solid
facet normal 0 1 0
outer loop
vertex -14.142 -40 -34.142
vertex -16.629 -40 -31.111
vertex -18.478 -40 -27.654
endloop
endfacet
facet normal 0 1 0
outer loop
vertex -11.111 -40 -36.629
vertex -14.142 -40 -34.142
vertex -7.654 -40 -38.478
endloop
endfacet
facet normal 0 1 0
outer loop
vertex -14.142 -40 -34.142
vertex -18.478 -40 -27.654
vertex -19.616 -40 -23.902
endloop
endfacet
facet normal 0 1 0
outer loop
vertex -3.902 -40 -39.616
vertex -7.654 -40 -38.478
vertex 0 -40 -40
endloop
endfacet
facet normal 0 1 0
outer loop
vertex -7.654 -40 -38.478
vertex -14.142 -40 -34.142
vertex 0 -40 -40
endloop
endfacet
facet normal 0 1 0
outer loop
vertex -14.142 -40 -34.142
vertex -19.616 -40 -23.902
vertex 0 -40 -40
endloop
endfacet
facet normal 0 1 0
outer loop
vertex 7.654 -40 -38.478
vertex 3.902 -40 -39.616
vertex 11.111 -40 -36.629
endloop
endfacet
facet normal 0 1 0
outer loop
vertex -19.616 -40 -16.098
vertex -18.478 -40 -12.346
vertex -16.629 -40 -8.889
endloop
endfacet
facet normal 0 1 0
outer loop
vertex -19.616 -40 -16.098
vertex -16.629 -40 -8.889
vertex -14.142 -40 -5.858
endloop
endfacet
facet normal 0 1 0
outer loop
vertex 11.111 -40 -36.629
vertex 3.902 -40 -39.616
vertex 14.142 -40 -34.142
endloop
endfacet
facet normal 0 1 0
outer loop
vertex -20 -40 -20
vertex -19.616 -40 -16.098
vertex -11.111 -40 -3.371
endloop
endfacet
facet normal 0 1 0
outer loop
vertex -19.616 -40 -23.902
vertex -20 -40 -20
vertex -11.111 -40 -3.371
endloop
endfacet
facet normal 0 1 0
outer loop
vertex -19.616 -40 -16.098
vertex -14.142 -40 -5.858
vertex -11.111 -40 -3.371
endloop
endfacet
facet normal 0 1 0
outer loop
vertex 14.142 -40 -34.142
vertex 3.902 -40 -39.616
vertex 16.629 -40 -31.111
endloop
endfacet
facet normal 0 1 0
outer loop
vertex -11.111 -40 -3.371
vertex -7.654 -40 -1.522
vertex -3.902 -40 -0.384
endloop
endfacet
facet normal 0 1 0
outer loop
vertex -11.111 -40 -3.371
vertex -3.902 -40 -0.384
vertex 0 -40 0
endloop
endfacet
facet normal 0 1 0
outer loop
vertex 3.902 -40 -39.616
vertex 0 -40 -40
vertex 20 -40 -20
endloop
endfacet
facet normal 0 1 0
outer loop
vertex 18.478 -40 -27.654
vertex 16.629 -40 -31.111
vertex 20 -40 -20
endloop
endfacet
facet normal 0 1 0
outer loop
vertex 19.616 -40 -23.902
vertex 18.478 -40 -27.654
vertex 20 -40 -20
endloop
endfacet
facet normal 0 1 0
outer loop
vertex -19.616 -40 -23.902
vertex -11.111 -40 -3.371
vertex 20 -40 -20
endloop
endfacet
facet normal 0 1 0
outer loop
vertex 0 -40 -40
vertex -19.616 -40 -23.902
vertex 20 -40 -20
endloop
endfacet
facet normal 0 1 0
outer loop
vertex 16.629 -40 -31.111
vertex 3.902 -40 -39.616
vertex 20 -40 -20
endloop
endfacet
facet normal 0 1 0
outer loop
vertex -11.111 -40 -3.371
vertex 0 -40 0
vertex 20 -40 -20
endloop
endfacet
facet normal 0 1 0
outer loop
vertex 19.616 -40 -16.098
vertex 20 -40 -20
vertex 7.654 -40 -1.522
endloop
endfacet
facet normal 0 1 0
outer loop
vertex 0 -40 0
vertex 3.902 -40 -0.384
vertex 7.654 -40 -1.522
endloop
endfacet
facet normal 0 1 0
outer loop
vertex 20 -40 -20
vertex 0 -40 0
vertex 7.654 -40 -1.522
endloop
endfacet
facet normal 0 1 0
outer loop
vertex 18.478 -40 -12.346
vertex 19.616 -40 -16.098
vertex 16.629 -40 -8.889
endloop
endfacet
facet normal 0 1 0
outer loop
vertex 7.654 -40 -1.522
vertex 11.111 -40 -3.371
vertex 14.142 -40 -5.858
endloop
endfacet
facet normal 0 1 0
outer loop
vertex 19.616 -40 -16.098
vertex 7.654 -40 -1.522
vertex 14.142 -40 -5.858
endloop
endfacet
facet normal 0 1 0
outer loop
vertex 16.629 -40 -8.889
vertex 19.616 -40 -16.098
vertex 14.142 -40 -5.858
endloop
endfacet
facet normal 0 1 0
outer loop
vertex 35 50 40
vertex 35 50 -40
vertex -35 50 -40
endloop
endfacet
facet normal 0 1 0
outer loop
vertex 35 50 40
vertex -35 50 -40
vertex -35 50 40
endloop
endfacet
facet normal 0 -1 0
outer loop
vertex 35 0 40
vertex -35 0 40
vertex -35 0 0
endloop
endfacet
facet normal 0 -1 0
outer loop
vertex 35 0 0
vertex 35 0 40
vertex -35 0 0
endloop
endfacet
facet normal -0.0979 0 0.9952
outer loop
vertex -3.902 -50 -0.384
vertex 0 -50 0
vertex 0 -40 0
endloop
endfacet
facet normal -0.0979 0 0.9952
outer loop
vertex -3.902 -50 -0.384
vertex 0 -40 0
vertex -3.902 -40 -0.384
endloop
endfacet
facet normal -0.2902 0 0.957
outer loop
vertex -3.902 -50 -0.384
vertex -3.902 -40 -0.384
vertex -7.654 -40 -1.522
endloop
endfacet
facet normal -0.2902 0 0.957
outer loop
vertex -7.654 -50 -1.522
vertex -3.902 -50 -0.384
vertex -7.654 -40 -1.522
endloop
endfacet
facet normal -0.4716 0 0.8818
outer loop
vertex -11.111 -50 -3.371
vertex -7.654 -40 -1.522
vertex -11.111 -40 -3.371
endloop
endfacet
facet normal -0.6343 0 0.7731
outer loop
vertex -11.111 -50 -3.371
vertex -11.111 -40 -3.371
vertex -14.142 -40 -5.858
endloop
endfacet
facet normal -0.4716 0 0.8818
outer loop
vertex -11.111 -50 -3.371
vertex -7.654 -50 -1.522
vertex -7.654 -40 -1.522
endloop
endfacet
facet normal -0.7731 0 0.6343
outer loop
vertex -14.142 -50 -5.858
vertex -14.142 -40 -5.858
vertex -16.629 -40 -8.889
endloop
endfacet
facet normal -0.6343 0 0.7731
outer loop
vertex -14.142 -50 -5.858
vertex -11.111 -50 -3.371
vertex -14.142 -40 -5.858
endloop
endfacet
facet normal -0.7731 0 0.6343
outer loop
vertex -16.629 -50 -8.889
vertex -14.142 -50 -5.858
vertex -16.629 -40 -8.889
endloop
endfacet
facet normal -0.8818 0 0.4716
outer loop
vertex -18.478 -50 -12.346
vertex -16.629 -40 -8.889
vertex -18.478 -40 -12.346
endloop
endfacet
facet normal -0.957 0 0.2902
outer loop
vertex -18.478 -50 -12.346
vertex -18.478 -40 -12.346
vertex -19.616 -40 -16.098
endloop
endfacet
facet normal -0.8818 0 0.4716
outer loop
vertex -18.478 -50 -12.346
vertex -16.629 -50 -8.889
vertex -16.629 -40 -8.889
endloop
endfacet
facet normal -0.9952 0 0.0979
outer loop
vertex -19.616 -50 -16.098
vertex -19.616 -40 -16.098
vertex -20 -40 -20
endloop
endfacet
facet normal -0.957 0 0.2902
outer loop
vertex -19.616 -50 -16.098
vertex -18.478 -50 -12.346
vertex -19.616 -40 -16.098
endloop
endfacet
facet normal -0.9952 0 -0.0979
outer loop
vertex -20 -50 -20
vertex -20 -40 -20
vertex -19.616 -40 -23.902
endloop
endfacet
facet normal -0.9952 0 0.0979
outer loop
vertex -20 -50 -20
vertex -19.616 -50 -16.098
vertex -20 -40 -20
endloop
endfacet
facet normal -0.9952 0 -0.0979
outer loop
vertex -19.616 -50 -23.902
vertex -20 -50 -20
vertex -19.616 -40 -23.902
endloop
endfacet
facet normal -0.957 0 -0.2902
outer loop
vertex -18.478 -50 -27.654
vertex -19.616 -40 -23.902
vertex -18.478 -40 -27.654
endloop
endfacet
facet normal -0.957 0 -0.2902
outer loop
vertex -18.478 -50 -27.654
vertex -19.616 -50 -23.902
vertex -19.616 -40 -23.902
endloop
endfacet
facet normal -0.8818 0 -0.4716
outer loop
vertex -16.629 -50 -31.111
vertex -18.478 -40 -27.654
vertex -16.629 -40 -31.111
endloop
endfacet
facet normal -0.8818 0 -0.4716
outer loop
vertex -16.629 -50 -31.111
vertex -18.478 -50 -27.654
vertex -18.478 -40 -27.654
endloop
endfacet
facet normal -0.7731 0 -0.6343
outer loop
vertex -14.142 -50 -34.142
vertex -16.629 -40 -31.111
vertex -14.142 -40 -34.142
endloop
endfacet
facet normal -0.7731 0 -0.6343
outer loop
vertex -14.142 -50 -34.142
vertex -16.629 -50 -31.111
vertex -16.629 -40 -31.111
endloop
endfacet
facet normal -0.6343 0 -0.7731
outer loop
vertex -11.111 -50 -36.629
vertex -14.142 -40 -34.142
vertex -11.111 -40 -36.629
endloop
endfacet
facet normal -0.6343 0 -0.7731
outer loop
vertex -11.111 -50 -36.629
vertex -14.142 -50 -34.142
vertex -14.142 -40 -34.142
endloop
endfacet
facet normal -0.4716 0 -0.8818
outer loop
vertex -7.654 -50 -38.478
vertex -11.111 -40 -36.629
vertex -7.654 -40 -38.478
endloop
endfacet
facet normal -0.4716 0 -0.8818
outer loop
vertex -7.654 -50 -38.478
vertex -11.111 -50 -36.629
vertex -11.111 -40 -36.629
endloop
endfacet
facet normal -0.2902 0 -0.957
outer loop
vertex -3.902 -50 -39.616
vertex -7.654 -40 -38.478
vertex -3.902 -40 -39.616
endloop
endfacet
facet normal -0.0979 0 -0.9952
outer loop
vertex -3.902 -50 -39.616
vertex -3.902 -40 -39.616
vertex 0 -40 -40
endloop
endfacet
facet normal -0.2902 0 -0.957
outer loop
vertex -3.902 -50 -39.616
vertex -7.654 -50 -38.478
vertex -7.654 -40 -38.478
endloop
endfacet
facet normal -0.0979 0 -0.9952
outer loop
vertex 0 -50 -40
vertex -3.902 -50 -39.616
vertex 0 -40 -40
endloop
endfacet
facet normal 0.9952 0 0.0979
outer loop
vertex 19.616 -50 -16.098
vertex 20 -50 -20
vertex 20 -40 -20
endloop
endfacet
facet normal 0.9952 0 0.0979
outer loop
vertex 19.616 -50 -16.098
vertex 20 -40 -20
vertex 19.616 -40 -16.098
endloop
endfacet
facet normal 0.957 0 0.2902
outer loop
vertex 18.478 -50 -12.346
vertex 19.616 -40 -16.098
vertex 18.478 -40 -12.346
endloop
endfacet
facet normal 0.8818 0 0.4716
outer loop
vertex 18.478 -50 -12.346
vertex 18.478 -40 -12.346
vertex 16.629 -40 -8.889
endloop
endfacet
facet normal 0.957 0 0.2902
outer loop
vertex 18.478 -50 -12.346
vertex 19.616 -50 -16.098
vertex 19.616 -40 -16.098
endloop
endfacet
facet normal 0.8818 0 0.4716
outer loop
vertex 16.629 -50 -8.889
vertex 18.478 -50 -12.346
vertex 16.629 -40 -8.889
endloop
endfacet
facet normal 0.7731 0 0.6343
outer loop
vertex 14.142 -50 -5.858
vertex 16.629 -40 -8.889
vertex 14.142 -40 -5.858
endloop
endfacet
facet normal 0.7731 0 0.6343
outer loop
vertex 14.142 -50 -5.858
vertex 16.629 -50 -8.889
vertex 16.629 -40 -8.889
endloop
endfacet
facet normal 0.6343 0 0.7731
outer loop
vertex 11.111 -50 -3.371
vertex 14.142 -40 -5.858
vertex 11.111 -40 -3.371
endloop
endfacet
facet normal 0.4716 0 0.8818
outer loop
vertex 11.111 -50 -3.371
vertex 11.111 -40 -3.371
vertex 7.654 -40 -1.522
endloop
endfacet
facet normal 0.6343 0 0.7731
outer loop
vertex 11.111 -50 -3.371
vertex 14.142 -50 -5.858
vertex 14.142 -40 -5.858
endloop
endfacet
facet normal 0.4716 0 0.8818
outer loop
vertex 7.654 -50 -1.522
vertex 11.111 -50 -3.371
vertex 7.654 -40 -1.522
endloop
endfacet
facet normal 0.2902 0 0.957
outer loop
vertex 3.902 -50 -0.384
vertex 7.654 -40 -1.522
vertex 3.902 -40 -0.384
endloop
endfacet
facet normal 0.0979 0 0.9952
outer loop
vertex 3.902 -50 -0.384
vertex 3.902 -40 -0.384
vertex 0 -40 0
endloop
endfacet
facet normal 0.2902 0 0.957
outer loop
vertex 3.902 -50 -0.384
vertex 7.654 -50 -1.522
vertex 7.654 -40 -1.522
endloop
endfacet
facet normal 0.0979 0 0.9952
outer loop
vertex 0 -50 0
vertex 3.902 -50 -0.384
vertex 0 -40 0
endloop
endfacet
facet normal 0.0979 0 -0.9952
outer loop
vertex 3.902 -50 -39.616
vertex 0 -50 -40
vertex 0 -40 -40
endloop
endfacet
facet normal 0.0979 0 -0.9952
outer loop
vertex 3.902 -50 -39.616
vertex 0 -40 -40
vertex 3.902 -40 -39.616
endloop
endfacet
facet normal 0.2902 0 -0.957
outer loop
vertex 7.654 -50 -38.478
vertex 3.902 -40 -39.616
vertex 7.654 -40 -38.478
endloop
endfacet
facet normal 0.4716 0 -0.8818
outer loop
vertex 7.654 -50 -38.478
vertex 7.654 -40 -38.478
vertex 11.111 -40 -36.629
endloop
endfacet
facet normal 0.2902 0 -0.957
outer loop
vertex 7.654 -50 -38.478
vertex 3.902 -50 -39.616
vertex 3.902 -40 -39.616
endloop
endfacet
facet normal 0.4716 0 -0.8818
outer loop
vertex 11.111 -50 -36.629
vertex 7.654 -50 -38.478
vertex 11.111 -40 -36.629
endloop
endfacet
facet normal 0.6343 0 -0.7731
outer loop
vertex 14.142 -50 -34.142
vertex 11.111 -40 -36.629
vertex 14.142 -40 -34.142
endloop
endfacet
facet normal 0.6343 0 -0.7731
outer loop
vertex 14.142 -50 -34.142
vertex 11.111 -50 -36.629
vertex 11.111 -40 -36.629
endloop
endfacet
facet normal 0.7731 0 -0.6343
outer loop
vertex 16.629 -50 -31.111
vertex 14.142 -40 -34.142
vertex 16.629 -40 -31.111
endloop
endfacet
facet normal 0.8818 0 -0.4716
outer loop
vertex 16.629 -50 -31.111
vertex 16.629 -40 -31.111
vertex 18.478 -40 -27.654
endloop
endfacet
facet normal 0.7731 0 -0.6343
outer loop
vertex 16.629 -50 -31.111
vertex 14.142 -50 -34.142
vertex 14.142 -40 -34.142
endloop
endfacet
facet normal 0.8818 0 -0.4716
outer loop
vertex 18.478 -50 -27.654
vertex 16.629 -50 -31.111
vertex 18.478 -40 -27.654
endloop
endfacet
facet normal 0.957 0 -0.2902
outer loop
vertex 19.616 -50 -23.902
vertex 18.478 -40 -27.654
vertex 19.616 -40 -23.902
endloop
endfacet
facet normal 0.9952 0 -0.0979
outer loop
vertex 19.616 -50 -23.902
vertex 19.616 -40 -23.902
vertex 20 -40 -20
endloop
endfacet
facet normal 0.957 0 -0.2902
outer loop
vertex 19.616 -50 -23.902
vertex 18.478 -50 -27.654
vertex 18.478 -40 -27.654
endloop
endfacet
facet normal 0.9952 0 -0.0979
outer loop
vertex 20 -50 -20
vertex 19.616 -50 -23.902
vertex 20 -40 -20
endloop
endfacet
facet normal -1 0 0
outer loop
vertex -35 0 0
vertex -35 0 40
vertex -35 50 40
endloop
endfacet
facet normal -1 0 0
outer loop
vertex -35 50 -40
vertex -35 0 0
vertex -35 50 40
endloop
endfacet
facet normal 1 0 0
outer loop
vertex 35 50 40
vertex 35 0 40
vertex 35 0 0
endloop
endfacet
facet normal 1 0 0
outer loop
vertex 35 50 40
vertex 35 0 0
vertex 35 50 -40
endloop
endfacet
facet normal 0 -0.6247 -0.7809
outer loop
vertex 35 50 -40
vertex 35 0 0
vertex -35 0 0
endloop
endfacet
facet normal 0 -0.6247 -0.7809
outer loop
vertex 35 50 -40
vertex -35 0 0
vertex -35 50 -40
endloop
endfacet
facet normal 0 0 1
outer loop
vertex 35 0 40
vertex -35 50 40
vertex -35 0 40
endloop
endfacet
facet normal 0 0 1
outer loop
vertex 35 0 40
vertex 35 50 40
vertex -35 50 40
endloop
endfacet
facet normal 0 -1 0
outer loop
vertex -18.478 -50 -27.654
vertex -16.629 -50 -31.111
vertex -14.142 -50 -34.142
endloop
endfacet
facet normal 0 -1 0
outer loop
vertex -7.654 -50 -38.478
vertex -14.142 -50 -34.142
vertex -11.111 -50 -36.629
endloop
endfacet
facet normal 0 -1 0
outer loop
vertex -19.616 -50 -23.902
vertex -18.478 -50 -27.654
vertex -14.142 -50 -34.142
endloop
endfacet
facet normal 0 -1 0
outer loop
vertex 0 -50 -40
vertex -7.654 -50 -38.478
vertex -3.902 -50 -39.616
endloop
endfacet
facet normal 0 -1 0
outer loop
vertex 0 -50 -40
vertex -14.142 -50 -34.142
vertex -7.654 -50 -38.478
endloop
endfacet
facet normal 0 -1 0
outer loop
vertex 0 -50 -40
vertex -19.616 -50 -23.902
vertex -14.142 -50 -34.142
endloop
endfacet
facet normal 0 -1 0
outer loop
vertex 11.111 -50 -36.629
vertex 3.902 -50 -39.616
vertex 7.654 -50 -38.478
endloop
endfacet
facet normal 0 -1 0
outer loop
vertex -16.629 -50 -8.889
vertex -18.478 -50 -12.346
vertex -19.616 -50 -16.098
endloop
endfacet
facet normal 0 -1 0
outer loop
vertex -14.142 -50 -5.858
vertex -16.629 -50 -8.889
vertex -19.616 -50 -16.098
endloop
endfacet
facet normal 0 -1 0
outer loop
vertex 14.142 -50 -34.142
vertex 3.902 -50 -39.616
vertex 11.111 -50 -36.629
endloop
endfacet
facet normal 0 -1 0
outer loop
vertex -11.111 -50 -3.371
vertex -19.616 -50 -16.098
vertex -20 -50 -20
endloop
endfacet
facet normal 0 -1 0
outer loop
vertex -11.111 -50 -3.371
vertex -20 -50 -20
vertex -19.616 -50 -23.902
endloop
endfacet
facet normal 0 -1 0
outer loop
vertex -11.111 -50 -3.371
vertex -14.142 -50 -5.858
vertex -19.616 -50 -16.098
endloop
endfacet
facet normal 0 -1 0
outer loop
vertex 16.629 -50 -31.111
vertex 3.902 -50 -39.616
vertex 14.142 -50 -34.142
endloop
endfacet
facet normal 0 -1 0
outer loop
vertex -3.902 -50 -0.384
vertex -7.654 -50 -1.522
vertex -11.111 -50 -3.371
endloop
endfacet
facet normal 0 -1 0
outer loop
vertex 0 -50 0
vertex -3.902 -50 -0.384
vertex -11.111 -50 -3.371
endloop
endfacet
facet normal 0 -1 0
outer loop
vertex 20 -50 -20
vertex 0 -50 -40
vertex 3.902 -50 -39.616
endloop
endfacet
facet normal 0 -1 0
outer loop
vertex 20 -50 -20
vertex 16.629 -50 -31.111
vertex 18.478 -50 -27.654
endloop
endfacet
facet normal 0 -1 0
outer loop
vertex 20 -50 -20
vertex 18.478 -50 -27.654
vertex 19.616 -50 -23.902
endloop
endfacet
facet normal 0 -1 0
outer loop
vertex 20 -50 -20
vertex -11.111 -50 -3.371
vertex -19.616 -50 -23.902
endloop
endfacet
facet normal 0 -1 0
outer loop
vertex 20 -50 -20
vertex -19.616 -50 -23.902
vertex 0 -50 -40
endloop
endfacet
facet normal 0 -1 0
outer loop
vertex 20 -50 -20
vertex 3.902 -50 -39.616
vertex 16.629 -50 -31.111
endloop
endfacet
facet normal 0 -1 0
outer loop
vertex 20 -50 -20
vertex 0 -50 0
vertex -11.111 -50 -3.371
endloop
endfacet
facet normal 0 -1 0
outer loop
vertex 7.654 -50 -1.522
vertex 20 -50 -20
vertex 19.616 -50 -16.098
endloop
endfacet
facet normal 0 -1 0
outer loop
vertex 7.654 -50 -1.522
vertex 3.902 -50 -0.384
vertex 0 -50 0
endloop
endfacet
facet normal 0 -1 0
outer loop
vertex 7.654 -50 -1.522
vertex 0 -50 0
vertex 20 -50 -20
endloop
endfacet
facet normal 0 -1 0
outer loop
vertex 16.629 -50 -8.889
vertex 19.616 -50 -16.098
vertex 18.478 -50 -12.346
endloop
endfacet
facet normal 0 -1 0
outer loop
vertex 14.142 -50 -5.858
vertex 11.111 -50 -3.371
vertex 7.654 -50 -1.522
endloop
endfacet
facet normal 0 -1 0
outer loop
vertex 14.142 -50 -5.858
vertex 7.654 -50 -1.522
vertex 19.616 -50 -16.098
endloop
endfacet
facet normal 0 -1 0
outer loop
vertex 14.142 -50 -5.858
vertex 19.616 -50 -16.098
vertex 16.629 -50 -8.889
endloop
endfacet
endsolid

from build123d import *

# Parameters (mm, degrees)
F1_DEPTH = 35
F4_DEPTH = 10


with BuildPart() as f1:
    # F0 (on Right) → F1 (new body, symmetric)
    with BuildSketch(Plane.YZ):
        Polygon((0, 40), (0, 0), (50, -40), (50, 40), align=None)
    extrude(amount=F1_DEPTH, both=True)


with BuildPart() as f4:
    # F3 (on offset) → F4 (new body)
    with BuildSketch(Plane.XZ.offset(50)):
        with BuildLine():
            ThreePointArc((0, -40), (14.142136, -34.142136), (20, -20))
            ThreePointArc((20, -20), (14.142136, -5.857864), (0, 0))
            ThreePointArc((0, 0), (-20, -20), (0, -40))
        make_face()
    extrude(amount=-F4_DEPTH)


solid = Compound([f1.part, f4.part])
